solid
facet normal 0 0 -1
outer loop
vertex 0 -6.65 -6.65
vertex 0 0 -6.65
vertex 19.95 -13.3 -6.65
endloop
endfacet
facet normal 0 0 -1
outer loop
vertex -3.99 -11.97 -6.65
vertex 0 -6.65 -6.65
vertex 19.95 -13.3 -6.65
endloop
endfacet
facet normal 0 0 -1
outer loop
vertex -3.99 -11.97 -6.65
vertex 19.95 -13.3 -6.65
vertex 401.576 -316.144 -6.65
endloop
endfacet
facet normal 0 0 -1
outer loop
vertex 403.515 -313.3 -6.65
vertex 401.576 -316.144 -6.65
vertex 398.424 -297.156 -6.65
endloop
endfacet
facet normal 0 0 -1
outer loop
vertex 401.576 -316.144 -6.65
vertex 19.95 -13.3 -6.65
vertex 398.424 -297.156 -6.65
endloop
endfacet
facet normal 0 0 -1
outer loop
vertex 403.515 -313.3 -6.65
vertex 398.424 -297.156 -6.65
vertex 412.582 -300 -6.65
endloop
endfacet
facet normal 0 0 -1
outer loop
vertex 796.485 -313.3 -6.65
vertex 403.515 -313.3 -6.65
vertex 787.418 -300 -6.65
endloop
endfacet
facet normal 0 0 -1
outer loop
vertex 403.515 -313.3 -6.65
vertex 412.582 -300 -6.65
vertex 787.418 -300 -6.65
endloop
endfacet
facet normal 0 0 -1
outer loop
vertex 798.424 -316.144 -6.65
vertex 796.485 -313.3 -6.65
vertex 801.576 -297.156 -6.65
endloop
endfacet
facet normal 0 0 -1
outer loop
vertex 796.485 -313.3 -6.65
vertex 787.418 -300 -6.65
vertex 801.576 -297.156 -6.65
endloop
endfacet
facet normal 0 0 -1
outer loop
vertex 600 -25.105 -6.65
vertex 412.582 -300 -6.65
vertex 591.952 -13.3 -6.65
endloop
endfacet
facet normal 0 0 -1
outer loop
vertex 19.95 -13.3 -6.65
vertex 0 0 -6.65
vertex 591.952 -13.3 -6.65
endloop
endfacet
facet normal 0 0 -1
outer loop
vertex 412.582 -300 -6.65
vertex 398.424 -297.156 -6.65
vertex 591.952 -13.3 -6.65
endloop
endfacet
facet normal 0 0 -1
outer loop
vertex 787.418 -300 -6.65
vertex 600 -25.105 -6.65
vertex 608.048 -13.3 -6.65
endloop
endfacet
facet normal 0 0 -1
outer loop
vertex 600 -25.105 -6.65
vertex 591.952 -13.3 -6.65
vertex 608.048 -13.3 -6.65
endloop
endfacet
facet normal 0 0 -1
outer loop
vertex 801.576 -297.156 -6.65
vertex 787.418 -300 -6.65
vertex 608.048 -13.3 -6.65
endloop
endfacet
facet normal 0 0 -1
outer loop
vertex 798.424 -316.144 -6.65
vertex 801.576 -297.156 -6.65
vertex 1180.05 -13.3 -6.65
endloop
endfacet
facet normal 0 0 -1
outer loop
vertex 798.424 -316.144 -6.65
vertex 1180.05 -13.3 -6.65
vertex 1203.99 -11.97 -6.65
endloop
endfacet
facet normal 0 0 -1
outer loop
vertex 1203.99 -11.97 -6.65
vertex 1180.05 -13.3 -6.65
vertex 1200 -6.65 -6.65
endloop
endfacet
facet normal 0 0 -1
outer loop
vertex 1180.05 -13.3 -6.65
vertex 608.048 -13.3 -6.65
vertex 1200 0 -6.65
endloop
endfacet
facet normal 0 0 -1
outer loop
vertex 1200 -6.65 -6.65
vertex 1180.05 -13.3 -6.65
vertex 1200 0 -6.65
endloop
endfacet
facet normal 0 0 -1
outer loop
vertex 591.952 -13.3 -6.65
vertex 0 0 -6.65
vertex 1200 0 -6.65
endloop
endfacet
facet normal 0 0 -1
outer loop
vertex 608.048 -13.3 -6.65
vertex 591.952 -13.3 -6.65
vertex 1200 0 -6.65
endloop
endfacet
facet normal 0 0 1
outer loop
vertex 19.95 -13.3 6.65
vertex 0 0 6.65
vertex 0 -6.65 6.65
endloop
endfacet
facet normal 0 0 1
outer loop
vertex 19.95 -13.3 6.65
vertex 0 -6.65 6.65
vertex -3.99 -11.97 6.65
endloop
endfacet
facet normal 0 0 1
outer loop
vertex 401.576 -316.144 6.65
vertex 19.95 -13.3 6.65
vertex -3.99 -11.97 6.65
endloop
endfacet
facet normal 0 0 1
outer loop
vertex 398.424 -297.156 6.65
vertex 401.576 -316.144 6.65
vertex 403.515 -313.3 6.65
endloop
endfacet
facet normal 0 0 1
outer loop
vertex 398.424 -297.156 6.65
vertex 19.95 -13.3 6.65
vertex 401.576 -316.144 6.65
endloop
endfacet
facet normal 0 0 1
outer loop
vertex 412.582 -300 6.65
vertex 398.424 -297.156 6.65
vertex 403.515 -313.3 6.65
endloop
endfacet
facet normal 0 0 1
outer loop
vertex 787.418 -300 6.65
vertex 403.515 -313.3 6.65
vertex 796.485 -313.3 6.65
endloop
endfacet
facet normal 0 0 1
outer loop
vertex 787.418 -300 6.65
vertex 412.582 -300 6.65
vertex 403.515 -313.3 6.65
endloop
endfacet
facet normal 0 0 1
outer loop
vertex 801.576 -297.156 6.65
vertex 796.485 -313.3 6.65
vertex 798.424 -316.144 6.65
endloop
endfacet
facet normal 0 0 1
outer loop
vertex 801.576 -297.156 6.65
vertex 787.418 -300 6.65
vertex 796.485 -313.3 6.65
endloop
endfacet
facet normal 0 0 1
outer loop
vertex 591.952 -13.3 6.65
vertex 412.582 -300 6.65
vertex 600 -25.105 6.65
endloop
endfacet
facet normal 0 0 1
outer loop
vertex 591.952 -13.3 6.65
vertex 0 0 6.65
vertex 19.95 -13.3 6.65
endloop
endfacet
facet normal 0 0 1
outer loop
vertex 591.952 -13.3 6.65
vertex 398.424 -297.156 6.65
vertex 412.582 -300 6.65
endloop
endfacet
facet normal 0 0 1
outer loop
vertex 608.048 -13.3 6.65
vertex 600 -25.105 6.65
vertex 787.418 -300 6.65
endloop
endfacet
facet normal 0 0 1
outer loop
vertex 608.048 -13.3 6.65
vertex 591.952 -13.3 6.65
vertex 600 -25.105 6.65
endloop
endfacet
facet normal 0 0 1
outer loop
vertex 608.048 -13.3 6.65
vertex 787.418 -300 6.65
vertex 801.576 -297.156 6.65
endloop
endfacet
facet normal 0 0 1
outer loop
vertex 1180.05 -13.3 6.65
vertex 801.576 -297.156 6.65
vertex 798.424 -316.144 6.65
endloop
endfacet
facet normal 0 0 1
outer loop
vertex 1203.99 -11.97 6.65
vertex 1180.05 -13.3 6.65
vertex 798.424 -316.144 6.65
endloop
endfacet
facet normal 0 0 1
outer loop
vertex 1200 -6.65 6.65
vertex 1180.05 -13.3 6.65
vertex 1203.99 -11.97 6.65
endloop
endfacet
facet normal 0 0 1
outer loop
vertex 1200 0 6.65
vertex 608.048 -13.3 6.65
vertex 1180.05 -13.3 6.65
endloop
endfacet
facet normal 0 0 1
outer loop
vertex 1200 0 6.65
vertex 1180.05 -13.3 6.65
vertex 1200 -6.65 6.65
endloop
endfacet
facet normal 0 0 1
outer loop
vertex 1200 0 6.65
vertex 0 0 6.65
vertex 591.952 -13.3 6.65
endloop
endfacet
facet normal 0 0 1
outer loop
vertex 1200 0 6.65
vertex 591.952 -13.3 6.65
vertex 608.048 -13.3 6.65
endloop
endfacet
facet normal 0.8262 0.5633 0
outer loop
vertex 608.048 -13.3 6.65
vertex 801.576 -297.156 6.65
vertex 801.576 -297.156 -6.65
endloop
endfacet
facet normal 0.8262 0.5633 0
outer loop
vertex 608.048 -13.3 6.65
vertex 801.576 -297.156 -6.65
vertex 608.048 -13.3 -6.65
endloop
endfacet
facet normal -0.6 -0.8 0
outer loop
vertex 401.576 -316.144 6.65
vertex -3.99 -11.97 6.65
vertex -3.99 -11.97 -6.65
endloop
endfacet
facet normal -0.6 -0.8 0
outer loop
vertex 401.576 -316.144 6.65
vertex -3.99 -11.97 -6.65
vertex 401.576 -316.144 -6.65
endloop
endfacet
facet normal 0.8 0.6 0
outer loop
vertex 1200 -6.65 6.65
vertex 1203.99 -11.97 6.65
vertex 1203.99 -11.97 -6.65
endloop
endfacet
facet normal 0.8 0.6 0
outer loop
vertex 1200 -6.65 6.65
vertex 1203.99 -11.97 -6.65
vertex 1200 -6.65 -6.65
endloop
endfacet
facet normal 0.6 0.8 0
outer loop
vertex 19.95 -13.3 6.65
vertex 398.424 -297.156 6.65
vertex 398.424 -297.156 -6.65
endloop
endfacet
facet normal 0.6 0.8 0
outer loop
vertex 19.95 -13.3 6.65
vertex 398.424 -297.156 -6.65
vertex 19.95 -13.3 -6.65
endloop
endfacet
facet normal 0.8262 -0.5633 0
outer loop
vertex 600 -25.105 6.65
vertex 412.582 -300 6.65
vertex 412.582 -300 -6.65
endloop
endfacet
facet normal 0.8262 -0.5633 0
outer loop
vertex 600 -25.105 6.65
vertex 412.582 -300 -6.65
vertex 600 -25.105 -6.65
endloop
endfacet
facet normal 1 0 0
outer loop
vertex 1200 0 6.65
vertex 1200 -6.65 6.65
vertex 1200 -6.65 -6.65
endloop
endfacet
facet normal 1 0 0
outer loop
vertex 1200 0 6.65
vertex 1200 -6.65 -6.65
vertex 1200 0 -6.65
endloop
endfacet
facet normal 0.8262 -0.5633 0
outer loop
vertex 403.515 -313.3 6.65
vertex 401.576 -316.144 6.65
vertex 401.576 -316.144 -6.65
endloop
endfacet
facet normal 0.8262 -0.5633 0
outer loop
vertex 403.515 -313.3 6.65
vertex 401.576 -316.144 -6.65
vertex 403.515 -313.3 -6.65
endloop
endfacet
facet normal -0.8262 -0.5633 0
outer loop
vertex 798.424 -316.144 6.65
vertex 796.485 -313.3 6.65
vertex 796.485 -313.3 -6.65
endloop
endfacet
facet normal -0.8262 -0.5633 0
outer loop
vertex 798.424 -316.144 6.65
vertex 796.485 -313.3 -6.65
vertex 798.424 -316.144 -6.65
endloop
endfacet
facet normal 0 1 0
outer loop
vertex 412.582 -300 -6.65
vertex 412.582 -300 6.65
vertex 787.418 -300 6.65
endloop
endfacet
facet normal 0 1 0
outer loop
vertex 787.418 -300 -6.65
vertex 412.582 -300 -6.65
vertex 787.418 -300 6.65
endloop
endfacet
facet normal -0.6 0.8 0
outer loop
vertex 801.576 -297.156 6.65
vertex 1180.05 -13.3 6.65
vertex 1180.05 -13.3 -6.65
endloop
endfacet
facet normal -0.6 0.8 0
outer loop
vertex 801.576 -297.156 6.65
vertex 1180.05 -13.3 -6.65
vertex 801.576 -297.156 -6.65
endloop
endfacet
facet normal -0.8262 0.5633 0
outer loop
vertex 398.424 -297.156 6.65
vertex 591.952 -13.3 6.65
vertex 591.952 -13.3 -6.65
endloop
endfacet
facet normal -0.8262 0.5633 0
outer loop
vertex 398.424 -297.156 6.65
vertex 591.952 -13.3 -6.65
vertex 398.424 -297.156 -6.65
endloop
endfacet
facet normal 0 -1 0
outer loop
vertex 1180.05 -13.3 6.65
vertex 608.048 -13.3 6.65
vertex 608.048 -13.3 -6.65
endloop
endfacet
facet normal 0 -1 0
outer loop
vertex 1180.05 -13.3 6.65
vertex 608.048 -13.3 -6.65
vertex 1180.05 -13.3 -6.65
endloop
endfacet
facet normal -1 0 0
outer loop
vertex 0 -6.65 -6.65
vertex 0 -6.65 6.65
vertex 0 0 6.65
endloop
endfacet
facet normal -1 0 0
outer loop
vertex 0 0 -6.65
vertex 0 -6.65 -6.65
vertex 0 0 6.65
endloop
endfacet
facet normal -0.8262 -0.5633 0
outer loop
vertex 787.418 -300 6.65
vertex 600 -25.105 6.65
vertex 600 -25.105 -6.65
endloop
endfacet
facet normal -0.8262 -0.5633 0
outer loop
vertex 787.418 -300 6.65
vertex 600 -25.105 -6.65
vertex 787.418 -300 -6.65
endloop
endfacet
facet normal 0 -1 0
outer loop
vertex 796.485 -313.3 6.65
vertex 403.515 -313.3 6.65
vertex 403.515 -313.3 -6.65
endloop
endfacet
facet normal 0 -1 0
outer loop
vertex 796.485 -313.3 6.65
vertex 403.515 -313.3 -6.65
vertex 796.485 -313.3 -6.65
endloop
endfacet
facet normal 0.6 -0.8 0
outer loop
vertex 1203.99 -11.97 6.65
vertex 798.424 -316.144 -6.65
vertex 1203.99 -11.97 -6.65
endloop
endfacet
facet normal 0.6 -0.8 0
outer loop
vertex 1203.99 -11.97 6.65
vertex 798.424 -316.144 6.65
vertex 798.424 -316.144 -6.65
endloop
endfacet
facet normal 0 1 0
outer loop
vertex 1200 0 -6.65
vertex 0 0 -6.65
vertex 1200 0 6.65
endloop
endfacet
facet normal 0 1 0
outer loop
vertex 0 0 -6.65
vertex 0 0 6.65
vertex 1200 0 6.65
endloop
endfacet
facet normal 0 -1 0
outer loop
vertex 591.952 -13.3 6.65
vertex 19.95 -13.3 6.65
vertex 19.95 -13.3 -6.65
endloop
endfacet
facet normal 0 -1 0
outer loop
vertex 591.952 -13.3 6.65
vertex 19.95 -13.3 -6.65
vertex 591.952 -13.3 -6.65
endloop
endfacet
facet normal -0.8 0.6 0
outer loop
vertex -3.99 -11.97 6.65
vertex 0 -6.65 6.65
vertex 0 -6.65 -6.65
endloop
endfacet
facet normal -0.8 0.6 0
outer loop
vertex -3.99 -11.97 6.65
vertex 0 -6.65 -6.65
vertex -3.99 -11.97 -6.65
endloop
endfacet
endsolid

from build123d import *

# Parameters (mm, degrees)
SKETCH1_W           = 1200
SKETCH1_H           = 13.3
EXTRUDE_THIN1_DEPTH = 6.65
SKETCH2_W           = 400
SKETCH2_H           = 13.3
EXTRUDE_THIN2_DEPTH = 6.65
EXTRUDE_THIN3_DEPTH = 6.65


with BuildPart() as part:
    # Sketch1 → Extrude-Thin1 (new, symmetric)
    with BuildSketch(Plane.XY):
        with Locations((600, -6.65)):
            Rectangle(SKETCH1_W, SKETCH1_H)
    extrude(amount=EXTRUDE_THIN1_DEPTH, both=True)



with BuildPart() as body_2:
    # Sketch2 → Extrude-Thin2 (new, symmetric)
    with BuildSketch(Plane.XY):
        with Locations((600, -306.65)):
            Rectangle(SKETCH2_W, SKETCH2_H)
    extrude(amount=EXTRUDE_THIN2_DEPTH, both=True)


with BuildPart() as part_1:
    add(part.part)

    add(body_2.part)  # Extrude-Thin3 merges body 2
    # Sketch3 → Extrude-Thin3 (add, symmetric)
    with BuildSketch(Plane.XY):
        Polygon((1196.01, -1.33), (801.575558109, -297.155831418), (600, -1.494881561), (398.424441891, -297.155831418), (3.99, -1.33), (-3.99, -11.97), (401.575558109, -316.144168582), (600, -25.105118439), (798.424441891, -316.144168582), (1203.99, -11.97), align=None)
    extrude(amount=EXTRUDE_THIN3_DEPTH, both=True)


solid = part_1.part
